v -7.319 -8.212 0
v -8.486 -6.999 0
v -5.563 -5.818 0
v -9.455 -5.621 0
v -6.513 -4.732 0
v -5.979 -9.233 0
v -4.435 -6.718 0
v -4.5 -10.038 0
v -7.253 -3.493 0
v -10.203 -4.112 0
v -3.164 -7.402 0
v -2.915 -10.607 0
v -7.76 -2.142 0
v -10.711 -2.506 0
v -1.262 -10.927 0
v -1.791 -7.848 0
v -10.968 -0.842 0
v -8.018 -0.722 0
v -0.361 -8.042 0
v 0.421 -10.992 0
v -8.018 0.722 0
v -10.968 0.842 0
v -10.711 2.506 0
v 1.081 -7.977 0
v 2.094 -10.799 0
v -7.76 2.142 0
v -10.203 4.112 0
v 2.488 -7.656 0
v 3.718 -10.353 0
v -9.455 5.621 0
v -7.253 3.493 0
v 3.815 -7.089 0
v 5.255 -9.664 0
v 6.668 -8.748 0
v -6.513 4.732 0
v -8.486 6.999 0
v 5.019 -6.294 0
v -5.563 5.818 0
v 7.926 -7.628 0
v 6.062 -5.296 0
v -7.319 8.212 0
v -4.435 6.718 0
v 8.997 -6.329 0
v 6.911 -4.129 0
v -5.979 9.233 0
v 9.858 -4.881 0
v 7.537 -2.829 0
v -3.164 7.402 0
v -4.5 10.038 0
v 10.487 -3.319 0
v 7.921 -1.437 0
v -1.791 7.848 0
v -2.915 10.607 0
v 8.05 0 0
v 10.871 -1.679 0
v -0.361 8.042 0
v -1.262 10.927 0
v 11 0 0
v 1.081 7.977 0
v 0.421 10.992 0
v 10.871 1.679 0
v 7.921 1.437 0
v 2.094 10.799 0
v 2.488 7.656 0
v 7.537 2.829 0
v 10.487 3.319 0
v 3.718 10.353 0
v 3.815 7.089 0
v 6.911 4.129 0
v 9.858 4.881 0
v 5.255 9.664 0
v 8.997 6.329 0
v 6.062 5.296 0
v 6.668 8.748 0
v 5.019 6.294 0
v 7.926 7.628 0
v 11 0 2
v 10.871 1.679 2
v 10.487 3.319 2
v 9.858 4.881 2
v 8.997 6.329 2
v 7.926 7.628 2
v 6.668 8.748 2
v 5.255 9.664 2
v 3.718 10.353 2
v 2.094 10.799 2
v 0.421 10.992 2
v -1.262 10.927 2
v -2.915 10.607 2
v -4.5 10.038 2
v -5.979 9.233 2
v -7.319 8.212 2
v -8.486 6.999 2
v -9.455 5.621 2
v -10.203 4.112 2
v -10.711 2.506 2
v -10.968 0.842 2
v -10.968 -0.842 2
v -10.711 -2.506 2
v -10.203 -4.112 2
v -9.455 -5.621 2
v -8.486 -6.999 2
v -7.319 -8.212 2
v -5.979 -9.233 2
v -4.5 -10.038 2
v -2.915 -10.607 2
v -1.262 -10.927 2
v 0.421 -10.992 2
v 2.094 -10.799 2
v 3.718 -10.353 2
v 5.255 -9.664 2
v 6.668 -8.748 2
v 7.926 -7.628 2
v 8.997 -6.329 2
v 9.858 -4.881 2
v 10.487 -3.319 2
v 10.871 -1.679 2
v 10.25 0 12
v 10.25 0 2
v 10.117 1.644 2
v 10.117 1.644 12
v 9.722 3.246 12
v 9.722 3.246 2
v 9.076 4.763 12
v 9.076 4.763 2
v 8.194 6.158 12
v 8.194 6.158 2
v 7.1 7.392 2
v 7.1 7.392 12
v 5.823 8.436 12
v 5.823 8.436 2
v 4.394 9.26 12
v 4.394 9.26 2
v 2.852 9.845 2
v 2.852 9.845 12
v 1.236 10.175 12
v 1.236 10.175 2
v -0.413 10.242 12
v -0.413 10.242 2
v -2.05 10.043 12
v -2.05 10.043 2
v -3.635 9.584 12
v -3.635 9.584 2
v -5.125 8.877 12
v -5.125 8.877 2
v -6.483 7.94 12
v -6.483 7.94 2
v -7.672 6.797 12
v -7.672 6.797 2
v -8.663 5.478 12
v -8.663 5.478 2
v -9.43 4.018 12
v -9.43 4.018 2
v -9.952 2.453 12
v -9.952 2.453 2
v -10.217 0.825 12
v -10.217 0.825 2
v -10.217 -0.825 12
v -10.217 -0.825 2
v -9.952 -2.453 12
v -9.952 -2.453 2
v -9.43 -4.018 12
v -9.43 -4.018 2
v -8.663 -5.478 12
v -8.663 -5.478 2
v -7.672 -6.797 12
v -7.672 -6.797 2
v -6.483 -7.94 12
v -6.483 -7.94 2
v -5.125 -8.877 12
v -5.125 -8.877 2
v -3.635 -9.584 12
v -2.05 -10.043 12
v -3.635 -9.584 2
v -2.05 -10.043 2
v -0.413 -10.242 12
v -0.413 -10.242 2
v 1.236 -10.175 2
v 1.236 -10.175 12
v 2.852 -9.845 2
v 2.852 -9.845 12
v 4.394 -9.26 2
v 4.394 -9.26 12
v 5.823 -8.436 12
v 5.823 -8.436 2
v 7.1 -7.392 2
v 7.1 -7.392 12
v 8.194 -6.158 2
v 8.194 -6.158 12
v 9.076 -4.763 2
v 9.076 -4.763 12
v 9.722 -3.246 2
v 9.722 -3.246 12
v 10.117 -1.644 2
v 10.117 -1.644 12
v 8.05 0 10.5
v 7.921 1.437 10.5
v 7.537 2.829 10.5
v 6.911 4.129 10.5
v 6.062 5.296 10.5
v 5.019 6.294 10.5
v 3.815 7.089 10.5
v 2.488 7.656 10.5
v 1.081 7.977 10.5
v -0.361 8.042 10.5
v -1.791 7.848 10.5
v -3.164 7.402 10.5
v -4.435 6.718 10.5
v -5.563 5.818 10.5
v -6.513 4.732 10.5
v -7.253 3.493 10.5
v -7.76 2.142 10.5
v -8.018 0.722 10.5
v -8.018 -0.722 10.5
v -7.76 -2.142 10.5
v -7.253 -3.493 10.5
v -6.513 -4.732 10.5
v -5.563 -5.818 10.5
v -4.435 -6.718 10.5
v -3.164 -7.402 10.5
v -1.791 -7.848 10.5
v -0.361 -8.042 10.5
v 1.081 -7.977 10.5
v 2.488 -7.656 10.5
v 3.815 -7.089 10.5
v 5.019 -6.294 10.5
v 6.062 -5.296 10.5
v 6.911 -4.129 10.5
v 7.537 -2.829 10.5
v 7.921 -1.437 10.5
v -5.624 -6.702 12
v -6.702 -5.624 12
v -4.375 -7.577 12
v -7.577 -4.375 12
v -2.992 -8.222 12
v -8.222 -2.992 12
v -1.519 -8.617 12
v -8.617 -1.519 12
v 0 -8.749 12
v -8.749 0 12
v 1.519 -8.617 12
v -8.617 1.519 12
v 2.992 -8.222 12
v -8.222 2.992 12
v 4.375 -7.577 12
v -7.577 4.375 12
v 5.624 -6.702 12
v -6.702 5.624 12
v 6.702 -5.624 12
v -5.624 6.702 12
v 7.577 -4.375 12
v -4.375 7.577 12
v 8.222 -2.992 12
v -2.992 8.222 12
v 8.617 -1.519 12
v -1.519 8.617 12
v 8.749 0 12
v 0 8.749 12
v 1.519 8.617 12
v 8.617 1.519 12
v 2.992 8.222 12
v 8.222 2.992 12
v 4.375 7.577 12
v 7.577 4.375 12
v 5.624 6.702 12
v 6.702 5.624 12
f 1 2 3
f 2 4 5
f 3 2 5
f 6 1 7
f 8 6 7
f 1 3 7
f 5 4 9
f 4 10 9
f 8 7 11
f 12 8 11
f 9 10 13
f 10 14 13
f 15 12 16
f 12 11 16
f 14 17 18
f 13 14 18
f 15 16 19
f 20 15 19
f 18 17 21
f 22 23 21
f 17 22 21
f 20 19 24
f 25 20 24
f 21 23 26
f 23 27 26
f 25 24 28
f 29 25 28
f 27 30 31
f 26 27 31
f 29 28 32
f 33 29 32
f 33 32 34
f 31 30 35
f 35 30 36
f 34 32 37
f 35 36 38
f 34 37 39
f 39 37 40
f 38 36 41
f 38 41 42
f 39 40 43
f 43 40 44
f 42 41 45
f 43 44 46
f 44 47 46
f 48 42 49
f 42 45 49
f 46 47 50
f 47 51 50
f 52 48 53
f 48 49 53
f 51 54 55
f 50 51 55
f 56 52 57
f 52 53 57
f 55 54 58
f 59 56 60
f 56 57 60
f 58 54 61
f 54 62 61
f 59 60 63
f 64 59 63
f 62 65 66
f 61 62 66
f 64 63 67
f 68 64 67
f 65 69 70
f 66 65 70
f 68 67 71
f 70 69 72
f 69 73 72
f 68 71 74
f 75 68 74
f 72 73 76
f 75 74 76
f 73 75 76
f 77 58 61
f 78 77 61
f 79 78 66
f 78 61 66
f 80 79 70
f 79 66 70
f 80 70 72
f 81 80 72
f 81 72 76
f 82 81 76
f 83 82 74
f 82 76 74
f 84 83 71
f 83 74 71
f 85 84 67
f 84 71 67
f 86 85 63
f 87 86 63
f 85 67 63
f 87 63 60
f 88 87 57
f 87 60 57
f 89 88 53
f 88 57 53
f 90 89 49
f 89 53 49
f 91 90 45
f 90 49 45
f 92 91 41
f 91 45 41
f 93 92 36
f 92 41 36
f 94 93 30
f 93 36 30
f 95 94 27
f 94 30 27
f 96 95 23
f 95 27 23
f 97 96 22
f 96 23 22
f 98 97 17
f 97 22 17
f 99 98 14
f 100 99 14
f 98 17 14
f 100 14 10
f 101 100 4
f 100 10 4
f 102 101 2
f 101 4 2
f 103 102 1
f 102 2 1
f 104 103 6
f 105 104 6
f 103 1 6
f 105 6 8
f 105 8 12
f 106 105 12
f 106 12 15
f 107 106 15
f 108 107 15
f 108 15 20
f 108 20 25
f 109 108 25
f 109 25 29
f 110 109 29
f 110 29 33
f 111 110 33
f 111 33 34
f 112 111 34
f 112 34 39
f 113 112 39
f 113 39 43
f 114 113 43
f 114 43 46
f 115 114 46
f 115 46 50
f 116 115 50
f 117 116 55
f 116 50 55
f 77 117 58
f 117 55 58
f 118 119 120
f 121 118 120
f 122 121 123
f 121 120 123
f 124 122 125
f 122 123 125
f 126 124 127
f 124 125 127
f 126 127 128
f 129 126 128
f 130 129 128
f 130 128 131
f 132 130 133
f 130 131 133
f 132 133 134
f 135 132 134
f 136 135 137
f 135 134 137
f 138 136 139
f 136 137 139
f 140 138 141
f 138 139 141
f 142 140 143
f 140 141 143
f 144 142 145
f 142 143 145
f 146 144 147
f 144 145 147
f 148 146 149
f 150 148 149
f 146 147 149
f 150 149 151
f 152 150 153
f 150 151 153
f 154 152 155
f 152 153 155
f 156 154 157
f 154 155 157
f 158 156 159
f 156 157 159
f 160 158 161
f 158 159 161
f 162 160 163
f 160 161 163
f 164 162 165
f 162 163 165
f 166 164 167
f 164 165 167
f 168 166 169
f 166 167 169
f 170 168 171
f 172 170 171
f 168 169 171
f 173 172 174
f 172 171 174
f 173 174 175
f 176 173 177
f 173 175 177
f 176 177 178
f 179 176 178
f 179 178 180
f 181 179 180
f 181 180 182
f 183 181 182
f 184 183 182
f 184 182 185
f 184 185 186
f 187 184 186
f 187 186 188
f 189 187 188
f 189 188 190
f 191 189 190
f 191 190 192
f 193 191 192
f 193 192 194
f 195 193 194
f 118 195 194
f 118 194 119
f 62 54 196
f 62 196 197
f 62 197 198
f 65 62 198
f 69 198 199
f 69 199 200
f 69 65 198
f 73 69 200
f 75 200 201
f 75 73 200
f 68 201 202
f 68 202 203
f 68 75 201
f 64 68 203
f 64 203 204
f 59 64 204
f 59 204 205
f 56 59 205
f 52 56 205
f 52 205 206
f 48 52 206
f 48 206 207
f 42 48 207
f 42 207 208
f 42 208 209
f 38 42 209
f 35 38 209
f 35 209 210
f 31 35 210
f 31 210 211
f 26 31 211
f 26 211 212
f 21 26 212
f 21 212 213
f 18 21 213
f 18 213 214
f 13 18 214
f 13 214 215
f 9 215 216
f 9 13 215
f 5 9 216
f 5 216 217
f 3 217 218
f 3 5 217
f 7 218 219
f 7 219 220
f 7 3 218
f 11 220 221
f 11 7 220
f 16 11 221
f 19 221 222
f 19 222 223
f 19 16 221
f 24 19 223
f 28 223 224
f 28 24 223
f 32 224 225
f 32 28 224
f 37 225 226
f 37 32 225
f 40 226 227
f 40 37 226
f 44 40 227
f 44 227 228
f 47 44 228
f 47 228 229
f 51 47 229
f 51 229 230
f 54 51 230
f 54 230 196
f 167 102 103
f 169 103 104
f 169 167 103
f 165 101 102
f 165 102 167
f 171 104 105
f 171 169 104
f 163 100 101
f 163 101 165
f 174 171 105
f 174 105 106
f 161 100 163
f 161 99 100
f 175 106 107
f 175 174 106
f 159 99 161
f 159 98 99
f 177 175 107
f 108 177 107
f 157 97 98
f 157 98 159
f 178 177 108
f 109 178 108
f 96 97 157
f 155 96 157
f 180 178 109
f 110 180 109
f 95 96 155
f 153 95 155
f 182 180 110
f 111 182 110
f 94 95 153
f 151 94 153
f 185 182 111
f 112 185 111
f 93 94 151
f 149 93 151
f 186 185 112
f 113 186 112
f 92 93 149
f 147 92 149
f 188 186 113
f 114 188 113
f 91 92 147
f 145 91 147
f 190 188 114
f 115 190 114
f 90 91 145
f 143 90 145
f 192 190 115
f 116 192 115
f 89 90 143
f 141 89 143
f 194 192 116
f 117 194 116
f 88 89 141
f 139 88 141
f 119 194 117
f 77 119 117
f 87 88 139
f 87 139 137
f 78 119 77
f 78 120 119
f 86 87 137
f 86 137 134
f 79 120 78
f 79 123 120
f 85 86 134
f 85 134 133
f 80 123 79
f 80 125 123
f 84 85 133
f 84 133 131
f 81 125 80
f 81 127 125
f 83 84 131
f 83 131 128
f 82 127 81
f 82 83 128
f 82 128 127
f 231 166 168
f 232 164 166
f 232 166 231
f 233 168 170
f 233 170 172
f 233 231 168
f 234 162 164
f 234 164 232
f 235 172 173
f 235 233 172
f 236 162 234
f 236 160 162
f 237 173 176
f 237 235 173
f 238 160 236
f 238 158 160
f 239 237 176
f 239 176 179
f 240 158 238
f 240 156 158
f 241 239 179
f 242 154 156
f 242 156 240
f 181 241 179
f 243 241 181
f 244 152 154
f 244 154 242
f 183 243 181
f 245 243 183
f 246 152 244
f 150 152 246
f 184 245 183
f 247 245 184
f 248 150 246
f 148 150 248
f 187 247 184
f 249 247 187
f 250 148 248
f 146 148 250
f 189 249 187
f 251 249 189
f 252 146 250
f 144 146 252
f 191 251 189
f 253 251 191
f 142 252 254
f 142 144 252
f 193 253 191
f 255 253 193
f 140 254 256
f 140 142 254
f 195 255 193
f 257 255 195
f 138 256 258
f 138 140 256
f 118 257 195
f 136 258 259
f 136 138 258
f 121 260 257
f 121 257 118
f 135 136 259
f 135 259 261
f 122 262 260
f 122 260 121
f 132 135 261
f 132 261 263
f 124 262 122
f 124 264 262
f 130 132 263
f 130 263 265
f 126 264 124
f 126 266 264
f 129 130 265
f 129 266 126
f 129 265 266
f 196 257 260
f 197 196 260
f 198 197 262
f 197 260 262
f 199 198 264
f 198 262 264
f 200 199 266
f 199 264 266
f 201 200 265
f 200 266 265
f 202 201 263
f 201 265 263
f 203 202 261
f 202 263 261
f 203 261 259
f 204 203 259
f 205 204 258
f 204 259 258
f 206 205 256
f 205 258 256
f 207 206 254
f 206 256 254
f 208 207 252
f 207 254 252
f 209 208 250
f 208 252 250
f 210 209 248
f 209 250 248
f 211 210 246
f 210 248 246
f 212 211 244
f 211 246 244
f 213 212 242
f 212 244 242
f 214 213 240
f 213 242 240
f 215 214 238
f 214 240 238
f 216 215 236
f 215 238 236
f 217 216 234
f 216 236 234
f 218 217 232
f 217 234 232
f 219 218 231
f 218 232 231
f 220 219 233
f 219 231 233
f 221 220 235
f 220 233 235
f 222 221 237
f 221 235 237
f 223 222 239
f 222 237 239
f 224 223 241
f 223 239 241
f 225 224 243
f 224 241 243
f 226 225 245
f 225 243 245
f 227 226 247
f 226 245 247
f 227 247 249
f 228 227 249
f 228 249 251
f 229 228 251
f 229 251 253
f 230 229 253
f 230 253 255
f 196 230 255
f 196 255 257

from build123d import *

# Parameters (mm, degrees)
F0_R     = 11
F0_R_2   = 8.05
F1_DEPTH = 2
F2_R     = 10.25
F2_R_2   = 8.05
F3_DEPTH = 10
F4_SIZE2 = 0.6994614872
F4_SIZE  = 1.5


with BuildPart() as f1:
    # F0 (on Top) → F1 (new body)
    with BuildSketch(Plane.XY):
        Circle(F0_R)
        Circle(F0_R_2, mode=Mode.SUBTRACT)
    extrude(amount=F1_DEPTH)

    # F2 (on face) → F3 (join)
    with BuildSketch(Plane.XY.offset(2)):
        Circle(F2_R)
        Circle(F2_R_2, mode=Mode.SUBTRACT)
    extrude(amount=F3_DEPTH)

    # F4
    f4_edges = [f1.edges().sort_by_distance(p)[0] for p in [
        (-8.05, 0, 12),
    ]]
    f4_side = f1.faces().sort_by_distance((-8.05, 0, 6))[0]
    chamfer(f4_edges, length=F4_SIZE, length2=F4_SIZE2, reference=f4_side)


solid = f1.part
